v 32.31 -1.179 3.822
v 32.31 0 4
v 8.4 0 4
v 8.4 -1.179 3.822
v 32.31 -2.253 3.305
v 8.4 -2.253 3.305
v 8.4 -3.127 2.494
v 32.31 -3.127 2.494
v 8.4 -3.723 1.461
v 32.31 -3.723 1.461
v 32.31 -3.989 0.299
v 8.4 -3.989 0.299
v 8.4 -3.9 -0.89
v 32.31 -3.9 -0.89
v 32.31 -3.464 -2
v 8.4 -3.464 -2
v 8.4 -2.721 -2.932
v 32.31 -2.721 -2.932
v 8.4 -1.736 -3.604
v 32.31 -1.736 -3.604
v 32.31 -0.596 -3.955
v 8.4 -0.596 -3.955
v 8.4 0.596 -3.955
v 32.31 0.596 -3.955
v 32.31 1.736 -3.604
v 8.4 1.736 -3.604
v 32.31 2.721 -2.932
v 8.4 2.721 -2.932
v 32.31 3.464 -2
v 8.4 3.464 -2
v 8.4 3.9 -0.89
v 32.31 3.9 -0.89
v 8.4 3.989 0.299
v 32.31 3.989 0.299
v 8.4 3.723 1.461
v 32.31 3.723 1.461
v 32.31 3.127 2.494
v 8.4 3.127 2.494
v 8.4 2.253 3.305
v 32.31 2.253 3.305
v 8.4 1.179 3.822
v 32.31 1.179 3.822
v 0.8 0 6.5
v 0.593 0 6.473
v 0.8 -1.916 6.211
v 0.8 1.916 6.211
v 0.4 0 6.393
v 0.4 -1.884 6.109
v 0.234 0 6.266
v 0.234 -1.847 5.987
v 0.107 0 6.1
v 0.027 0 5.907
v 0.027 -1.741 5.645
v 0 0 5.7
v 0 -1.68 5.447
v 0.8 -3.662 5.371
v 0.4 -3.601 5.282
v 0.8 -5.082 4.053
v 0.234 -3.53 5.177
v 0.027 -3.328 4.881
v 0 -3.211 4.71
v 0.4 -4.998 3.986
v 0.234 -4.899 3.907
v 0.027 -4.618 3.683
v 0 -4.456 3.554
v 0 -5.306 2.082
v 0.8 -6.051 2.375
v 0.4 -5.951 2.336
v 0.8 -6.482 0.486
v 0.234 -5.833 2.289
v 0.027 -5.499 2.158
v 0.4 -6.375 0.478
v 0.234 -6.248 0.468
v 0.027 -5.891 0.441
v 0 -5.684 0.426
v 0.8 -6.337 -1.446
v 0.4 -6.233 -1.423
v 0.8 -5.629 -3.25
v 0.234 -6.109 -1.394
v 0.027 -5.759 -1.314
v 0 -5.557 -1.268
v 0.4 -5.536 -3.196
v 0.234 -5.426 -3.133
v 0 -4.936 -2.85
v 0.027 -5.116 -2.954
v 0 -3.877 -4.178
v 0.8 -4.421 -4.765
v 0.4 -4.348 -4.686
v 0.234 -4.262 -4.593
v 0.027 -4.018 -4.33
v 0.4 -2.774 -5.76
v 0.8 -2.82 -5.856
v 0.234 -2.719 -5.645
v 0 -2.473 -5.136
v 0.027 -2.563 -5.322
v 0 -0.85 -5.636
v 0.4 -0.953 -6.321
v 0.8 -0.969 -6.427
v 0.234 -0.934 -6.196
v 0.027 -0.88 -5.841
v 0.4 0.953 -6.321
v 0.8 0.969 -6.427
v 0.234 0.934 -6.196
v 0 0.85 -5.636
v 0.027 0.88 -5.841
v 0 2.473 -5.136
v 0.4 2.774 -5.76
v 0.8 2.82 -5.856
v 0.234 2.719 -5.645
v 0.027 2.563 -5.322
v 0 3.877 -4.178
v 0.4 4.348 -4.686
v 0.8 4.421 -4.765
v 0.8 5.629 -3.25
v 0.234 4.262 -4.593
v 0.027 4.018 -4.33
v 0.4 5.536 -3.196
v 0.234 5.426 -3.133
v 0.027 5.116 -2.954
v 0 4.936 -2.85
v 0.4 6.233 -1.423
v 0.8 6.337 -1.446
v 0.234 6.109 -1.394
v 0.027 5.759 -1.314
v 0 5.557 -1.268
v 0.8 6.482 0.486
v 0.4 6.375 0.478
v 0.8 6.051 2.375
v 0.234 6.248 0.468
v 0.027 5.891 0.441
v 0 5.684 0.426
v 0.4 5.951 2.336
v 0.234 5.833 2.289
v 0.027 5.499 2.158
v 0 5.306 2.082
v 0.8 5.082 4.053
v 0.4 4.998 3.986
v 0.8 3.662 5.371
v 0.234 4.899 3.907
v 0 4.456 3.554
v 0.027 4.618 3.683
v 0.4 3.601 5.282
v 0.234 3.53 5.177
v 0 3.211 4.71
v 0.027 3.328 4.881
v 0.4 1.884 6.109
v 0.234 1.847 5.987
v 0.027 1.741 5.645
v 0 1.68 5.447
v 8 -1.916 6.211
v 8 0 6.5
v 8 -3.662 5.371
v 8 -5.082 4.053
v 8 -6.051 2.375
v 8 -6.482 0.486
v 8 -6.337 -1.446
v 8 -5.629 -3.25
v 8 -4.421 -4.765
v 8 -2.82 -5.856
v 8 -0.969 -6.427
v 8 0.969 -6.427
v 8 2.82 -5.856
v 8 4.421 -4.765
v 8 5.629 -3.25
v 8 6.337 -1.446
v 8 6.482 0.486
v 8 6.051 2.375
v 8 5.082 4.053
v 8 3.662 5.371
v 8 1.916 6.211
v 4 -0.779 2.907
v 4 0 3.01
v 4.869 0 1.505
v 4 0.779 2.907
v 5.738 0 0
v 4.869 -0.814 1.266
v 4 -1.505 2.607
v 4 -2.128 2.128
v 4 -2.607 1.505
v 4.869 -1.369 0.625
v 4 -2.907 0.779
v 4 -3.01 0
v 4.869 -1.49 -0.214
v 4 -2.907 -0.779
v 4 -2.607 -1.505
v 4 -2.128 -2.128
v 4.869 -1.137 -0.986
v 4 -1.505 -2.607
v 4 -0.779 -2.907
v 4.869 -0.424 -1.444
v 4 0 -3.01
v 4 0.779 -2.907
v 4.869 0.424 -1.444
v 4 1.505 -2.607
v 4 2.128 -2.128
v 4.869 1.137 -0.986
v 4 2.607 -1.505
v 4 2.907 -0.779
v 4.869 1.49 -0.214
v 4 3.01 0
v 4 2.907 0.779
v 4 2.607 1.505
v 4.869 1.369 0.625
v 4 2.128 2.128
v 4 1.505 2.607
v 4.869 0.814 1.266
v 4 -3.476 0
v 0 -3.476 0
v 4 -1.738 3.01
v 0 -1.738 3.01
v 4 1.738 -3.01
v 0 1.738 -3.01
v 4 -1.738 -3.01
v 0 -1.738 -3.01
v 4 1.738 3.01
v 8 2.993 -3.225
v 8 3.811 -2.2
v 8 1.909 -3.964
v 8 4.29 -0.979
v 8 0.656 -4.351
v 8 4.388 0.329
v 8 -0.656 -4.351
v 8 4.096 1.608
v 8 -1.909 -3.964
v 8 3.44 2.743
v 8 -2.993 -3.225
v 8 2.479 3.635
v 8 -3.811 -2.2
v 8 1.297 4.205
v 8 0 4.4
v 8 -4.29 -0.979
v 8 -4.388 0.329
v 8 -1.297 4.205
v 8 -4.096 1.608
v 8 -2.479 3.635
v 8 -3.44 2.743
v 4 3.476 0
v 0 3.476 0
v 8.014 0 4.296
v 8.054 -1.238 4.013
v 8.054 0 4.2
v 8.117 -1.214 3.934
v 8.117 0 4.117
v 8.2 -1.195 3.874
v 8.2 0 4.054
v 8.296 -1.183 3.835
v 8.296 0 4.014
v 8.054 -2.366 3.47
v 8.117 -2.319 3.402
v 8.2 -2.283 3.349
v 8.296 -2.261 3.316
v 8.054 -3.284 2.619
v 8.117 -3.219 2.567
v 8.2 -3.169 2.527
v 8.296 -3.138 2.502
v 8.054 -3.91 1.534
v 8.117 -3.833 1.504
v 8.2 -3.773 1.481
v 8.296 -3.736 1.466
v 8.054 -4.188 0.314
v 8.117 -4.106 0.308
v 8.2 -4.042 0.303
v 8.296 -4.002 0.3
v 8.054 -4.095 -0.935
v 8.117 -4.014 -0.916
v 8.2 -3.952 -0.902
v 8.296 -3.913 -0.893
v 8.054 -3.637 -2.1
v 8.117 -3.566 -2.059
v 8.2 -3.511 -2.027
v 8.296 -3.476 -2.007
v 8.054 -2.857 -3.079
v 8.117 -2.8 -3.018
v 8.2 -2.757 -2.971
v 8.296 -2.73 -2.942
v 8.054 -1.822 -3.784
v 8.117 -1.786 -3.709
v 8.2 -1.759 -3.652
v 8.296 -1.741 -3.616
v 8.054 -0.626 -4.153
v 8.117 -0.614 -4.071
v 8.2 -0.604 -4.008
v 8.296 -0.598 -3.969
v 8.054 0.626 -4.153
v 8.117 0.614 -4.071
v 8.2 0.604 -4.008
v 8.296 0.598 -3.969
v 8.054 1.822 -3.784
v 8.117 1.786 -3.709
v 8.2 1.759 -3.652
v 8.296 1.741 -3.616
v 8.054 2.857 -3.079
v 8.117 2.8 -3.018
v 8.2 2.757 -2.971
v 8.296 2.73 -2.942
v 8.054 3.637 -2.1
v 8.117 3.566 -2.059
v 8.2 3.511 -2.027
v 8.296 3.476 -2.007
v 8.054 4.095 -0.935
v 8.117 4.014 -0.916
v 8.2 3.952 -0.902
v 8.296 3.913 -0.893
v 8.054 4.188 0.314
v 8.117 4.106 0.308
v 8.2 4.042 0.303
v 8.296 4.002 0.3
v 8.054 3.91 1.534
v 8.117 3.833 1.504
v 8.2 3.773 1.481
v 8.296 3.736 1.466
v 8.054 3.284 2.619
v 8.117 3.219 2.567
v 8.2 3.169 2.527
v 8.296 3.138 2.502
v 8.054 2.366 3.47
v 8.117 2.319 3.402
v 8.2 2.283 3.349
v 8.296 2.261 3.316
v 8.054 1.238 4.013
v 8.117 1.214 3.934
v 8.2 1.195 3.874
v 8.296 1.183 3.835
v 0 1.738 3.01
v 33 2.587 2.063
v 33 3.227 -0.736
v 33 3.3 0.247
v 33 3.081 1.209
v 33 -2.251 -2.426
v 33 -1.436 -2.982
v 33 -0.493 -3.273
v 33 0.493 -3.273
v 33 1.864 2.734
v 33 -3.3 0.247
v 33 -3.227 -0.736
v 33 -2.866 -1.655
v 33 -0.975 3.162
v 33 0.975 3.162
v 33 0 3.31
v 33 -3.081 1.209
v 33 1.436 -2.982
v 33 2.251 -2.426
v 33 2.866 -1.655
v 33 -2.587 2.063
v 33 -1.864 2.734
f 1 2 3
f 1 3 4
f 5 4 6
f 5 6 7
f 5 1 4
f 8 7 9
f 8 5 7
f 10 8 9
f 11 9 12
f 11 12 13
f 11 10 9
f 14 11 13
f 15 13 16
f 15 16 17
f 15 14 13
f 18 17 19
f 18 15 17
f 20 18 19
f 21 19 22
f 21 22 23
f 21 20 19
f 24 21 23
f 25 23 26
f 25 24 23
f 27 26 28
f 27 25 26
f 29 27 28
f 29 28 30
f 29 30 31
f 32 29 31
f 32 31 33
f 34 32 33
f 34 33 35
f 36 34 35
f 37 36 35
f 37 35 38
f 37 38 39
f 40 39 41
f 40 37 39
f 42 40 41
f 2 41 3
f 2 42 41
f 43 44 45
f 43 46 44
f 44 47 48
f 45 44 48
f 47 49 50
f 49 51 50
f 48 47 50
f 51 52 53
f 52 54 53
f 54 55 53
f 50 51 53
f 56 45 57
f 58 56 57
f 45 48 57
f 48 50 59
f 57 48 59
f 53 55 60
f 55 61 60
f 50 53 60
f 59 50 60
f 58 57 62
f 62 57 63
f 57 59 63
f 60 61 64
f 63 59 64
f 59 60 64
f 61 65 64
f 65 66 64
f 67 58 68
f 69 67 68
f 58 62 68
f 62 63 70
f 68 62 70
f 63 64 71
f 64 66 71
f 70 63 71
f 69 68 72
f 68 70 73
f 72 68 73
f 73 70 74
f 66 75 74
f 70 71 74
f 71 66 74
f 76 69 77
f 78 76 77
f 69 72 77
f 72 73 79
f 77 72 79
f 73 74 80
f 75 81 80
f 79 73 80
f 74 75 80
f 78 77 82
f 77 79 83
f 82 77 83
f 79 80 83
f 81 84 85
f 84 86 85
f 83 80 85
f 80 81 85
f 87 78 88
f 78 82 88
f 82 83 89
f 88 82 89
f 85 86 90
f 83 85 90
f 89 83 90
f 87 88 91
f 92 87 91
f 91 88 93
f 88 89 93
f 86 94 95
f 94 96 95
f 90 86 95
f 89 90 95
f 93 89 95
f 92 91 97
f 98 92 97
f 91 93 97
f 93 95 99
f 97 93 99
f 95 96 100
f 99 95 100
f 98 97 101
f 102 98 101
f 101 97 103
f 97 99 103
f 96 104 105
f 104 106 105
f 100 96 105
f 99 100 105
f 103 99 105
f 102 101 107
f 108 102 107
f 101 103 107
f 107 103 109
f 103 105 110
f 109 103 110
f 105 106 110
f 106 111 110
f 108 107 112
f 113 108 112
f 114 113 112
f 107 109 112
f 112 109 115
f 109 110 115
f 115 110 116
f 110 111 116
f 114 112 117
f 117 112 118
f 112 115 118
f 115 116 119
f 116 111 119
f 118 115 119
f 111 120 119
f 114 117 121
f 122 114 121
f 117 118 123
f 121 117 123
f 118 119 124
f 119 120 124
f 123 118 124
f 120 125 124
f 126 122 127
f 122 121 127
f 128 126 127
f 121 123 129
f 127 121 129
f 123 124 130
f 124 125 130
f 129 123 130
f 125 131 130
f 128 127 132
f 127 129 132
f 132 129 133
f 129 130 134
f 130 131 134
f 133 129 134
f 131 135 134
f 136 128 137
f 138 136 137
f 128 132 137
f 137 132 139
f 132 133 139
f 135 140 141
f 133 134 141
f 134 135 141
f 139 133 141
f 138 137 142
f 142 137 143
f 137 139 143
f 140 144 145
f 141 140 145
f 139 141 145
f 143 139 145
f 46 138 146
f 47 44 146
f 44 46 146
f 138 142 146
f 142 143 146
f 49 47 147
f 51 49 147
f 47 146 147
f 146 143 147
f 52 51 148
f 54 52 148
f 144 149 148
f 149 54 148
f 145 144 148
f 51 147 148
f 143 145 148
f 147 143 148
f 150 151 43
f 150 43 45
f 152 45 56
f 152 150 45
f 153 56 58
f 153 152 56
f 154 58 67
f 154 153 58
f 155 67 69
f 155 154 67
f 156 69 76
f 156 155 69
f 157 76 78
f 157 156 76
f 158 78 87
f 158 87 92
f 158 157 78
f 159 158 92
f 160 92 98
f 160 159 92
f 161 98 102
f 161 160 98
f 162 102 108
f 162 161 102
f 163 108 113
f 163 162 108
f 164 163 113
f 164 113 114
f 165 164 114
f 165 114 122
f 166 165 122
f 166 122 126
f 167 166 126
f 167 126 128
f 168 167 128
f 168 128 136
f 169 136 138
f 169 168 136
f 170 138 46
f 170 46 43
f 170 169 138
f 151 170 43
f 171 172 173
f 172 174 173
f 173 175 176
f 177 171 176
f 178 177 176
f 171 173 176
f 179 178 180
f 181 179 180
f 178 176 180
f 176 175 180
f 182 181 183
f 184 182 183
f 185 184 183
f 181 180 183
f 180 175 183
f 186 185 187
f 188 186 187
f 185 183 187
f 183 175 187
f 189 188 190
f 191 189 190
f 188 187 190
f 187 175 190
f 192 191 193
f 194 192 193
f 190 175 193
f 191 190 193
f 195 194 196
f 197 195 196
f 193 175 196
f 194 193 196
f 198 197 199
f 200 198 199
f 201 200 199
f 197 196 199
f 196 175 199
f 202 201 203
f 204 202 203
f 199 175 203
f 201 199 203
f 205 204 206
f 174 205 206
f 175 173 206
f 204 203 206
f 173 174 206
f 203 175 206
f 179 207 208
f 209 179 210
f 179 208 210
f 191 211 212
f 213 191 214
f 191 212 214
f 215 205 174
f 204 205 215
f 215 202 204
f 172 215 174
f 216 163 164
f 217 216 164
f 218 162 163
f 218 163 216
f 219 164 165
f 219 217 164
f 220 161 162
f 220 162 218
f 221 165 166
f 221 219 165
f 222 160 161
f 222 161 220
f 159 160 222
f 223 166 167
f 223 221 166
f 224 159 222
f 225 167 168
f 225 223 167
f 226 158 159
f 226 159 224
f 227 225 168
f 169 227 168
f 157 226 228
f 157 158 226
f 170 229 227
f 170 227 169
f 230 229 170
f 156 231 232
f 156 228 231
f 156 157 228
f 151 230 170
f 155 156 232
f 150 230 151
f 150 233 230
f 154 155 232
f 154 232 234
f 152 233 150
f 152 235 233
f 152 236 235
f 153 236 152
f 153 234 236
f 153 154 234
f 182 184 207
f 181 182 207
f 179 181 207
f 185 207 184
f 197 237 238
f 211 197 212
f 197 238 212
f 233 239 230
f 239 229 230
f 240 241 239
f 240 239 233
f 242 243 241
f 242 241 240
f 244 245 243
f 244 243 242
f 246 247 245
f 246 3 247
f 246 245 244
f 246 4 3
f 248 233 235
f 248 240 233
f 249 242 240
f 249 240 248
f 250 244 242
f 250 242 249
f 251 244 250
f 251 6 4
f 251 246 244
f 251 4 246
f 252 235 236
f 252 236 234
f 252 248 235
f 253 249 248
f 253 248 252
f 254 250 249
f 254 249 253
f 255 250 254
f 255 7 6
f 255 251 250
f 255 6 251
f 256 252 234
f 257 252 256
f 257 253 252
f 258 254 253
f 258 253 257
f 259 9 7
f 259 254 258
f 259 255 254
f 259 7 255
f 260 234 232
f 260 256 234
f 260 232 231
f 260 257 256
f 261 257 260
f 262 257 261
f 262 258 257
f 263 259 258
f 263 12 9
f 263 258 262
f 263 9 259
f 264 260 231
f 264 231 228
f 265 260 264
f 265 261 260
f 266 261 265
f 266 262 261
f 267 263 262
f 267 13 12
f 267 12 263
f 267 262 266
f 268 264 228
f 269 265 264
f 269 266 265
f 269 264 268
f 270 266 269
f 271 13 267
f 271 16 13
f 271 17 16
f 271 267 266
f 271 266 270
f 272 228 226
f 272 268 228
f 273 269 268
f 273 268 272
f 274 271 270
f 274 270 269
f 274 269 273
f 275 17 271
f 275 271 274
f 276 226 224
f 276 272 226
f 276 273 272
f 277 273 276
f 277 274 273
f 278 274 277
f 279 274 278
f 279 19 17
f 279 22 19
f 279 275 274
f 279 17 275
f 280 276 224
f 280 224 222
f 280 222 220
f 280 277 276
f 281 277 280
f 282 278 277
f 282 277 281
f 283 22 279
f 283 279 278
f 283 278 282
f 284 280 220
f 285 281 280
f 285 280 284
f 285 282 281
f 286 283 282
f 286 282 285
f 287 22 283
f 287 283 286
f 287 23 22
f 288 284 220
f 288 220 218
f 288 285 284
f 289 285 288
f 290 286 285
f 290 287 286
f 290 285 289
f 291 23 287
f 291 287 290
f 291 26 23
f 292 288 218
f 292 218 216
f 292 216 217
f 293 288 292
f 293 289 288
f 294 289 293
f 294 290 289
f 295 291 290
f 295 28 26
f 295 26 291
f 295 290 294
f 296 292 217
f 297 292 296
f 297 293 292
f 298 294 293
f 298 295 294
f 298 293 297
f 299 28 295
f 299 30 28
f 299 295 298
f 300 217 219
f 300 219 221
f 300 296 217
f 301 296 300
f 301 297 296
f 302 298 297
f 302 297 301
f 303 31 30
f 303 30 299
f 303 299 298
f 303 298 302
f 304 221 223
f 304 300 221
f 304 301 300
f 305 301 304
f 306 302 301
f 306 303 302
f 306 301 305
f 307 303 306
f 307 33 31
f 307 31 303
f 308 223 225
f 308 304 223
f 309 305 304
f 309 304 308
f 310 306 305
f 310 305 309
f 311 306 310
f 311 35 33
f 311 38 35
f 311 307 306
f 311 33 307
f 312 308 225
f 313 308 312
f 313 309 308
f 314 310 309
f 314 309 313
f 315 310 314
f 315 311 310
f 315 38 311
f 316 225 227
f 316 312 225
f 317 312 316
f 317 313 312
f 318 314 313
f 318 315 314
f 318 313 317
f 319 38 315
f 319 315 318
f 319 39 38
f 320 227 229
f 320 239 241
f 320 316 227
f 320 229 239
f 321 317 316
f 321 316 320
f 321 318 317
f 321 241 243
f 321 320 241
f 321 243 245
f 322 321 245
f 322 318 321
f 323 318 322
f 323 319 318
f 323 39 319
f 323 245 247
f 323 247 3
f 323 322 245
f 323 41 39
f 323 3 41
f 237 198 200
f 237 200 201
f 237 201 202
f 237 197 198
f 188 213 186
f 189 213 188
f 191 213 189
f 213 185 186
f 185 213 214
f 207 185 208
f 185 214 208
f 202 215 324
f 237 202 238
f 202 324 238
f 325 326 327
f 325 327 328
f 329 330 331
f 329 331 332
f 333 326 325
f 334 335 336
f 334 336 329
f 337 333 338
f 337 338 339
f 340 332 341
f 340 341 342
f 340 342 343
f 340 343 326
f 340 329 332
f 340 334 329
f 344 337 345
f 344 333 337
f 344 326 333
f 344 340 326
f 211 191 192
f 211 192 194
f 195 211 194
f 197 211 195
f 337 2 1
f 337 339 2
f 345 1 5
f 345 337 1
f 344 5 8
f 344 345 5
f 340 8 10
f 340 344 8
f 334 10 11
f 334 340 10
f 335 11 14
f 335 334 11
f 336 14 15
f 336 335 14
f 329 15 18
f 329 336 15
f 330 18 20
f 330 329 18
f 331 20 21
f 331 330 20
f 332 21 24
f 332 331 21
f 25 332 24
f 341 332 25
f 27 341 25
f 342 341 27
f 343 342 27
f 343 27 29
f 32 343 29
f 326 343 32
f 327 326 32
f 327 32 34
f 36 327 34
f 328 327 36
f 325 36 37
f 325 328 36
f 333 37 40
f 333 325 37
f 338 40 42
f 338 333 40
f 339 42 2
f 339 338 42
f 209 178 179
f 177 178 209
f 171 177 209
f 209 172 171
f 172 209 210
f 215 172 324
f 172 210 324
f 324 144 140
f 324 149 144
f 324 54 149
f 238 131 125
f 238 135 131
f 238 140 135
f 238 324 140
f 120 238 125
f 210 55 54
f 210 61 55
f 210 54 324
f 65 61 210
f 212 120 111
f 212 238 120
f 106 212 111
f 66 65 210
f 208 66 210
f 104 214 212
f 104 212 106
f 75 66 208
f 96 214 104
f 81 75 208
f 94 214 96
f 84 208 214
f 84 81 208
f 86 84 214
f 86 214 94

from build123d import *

# Parameters (mm, degrees)
FILLET1_R   = 0.4
FILLET2_R   = 0.8
HEX_2_DEPTH = 4


with BuildPart() as part:
    # BodySke → Base-Revolve (revolve)
    with BuildSketch(Plane.XY, mode=Mode.PRIVATE) as base_revolve_sk:
        Polygon((0, 0), (0, 6.5), (8, 6.5), (8, 4), (32.3095, 4), (33, 3.3095), (33, 0), align=None)
    revolve(base_revolve_sk.sketch.rotate(Axis((-31.75, 0, 0), (1, 0, 0)), 90), axis=Axis((-31.75, 0, 0), (1, 0, 0)))  # turned: the seam where the file's is

    # Fillet1
    fillet1_edges = [part.edges().sort_by_distance(p)[0] for p in [
        (8, 0, -4),
    ]]
    fillet(fillet1_edges, radius=FILLET1_R)

    # Fillet2
    fillet2_edges = [part.edges().sort_by_distance(p)[0] for p in [
        (0, 0, -6.5),
    ]]
    fillet(fillet2_edges, radius=FILLET2_R)

    # Sketch2 → Hex-PreBroach (revolve, cut)
    with BuildSketch(Plane.XY, mode=Mode.PRIVATE) as hex_prebroach_sk:
        Polygon((0, 3.01), (4, 3.01), (5.73782431, 0), (0, 0), align=None)
    revolve(hex_prebroach_sk.sketch.rotate(Axis((0, 0, 0), (1, 0, 0)), 90), axis=Axis((0, 0, 0), (1, 0, 0)), mode=Mode.SUBTRACT)  # turned: the seam where the file's is

    # Sketch3 → Hex 2 (cut)
    with BuildSketch(Plane(origin=(0, 0, 0), x_dir=(0, 0.5, 0.866025404), z_dir=(-1, 0, 0))):
        Polygon((1.73782431, 3.01), (-1.73782431, 3.01), (-3.475648621, 0), (-1.73782431, -3.01), (1.73782431, -3.01), (3.475648621, 0), align=None)
    extrude(amount=-HEX_2_DEPTH, mode=Mode.SUBTRACT)


solid = part.part
